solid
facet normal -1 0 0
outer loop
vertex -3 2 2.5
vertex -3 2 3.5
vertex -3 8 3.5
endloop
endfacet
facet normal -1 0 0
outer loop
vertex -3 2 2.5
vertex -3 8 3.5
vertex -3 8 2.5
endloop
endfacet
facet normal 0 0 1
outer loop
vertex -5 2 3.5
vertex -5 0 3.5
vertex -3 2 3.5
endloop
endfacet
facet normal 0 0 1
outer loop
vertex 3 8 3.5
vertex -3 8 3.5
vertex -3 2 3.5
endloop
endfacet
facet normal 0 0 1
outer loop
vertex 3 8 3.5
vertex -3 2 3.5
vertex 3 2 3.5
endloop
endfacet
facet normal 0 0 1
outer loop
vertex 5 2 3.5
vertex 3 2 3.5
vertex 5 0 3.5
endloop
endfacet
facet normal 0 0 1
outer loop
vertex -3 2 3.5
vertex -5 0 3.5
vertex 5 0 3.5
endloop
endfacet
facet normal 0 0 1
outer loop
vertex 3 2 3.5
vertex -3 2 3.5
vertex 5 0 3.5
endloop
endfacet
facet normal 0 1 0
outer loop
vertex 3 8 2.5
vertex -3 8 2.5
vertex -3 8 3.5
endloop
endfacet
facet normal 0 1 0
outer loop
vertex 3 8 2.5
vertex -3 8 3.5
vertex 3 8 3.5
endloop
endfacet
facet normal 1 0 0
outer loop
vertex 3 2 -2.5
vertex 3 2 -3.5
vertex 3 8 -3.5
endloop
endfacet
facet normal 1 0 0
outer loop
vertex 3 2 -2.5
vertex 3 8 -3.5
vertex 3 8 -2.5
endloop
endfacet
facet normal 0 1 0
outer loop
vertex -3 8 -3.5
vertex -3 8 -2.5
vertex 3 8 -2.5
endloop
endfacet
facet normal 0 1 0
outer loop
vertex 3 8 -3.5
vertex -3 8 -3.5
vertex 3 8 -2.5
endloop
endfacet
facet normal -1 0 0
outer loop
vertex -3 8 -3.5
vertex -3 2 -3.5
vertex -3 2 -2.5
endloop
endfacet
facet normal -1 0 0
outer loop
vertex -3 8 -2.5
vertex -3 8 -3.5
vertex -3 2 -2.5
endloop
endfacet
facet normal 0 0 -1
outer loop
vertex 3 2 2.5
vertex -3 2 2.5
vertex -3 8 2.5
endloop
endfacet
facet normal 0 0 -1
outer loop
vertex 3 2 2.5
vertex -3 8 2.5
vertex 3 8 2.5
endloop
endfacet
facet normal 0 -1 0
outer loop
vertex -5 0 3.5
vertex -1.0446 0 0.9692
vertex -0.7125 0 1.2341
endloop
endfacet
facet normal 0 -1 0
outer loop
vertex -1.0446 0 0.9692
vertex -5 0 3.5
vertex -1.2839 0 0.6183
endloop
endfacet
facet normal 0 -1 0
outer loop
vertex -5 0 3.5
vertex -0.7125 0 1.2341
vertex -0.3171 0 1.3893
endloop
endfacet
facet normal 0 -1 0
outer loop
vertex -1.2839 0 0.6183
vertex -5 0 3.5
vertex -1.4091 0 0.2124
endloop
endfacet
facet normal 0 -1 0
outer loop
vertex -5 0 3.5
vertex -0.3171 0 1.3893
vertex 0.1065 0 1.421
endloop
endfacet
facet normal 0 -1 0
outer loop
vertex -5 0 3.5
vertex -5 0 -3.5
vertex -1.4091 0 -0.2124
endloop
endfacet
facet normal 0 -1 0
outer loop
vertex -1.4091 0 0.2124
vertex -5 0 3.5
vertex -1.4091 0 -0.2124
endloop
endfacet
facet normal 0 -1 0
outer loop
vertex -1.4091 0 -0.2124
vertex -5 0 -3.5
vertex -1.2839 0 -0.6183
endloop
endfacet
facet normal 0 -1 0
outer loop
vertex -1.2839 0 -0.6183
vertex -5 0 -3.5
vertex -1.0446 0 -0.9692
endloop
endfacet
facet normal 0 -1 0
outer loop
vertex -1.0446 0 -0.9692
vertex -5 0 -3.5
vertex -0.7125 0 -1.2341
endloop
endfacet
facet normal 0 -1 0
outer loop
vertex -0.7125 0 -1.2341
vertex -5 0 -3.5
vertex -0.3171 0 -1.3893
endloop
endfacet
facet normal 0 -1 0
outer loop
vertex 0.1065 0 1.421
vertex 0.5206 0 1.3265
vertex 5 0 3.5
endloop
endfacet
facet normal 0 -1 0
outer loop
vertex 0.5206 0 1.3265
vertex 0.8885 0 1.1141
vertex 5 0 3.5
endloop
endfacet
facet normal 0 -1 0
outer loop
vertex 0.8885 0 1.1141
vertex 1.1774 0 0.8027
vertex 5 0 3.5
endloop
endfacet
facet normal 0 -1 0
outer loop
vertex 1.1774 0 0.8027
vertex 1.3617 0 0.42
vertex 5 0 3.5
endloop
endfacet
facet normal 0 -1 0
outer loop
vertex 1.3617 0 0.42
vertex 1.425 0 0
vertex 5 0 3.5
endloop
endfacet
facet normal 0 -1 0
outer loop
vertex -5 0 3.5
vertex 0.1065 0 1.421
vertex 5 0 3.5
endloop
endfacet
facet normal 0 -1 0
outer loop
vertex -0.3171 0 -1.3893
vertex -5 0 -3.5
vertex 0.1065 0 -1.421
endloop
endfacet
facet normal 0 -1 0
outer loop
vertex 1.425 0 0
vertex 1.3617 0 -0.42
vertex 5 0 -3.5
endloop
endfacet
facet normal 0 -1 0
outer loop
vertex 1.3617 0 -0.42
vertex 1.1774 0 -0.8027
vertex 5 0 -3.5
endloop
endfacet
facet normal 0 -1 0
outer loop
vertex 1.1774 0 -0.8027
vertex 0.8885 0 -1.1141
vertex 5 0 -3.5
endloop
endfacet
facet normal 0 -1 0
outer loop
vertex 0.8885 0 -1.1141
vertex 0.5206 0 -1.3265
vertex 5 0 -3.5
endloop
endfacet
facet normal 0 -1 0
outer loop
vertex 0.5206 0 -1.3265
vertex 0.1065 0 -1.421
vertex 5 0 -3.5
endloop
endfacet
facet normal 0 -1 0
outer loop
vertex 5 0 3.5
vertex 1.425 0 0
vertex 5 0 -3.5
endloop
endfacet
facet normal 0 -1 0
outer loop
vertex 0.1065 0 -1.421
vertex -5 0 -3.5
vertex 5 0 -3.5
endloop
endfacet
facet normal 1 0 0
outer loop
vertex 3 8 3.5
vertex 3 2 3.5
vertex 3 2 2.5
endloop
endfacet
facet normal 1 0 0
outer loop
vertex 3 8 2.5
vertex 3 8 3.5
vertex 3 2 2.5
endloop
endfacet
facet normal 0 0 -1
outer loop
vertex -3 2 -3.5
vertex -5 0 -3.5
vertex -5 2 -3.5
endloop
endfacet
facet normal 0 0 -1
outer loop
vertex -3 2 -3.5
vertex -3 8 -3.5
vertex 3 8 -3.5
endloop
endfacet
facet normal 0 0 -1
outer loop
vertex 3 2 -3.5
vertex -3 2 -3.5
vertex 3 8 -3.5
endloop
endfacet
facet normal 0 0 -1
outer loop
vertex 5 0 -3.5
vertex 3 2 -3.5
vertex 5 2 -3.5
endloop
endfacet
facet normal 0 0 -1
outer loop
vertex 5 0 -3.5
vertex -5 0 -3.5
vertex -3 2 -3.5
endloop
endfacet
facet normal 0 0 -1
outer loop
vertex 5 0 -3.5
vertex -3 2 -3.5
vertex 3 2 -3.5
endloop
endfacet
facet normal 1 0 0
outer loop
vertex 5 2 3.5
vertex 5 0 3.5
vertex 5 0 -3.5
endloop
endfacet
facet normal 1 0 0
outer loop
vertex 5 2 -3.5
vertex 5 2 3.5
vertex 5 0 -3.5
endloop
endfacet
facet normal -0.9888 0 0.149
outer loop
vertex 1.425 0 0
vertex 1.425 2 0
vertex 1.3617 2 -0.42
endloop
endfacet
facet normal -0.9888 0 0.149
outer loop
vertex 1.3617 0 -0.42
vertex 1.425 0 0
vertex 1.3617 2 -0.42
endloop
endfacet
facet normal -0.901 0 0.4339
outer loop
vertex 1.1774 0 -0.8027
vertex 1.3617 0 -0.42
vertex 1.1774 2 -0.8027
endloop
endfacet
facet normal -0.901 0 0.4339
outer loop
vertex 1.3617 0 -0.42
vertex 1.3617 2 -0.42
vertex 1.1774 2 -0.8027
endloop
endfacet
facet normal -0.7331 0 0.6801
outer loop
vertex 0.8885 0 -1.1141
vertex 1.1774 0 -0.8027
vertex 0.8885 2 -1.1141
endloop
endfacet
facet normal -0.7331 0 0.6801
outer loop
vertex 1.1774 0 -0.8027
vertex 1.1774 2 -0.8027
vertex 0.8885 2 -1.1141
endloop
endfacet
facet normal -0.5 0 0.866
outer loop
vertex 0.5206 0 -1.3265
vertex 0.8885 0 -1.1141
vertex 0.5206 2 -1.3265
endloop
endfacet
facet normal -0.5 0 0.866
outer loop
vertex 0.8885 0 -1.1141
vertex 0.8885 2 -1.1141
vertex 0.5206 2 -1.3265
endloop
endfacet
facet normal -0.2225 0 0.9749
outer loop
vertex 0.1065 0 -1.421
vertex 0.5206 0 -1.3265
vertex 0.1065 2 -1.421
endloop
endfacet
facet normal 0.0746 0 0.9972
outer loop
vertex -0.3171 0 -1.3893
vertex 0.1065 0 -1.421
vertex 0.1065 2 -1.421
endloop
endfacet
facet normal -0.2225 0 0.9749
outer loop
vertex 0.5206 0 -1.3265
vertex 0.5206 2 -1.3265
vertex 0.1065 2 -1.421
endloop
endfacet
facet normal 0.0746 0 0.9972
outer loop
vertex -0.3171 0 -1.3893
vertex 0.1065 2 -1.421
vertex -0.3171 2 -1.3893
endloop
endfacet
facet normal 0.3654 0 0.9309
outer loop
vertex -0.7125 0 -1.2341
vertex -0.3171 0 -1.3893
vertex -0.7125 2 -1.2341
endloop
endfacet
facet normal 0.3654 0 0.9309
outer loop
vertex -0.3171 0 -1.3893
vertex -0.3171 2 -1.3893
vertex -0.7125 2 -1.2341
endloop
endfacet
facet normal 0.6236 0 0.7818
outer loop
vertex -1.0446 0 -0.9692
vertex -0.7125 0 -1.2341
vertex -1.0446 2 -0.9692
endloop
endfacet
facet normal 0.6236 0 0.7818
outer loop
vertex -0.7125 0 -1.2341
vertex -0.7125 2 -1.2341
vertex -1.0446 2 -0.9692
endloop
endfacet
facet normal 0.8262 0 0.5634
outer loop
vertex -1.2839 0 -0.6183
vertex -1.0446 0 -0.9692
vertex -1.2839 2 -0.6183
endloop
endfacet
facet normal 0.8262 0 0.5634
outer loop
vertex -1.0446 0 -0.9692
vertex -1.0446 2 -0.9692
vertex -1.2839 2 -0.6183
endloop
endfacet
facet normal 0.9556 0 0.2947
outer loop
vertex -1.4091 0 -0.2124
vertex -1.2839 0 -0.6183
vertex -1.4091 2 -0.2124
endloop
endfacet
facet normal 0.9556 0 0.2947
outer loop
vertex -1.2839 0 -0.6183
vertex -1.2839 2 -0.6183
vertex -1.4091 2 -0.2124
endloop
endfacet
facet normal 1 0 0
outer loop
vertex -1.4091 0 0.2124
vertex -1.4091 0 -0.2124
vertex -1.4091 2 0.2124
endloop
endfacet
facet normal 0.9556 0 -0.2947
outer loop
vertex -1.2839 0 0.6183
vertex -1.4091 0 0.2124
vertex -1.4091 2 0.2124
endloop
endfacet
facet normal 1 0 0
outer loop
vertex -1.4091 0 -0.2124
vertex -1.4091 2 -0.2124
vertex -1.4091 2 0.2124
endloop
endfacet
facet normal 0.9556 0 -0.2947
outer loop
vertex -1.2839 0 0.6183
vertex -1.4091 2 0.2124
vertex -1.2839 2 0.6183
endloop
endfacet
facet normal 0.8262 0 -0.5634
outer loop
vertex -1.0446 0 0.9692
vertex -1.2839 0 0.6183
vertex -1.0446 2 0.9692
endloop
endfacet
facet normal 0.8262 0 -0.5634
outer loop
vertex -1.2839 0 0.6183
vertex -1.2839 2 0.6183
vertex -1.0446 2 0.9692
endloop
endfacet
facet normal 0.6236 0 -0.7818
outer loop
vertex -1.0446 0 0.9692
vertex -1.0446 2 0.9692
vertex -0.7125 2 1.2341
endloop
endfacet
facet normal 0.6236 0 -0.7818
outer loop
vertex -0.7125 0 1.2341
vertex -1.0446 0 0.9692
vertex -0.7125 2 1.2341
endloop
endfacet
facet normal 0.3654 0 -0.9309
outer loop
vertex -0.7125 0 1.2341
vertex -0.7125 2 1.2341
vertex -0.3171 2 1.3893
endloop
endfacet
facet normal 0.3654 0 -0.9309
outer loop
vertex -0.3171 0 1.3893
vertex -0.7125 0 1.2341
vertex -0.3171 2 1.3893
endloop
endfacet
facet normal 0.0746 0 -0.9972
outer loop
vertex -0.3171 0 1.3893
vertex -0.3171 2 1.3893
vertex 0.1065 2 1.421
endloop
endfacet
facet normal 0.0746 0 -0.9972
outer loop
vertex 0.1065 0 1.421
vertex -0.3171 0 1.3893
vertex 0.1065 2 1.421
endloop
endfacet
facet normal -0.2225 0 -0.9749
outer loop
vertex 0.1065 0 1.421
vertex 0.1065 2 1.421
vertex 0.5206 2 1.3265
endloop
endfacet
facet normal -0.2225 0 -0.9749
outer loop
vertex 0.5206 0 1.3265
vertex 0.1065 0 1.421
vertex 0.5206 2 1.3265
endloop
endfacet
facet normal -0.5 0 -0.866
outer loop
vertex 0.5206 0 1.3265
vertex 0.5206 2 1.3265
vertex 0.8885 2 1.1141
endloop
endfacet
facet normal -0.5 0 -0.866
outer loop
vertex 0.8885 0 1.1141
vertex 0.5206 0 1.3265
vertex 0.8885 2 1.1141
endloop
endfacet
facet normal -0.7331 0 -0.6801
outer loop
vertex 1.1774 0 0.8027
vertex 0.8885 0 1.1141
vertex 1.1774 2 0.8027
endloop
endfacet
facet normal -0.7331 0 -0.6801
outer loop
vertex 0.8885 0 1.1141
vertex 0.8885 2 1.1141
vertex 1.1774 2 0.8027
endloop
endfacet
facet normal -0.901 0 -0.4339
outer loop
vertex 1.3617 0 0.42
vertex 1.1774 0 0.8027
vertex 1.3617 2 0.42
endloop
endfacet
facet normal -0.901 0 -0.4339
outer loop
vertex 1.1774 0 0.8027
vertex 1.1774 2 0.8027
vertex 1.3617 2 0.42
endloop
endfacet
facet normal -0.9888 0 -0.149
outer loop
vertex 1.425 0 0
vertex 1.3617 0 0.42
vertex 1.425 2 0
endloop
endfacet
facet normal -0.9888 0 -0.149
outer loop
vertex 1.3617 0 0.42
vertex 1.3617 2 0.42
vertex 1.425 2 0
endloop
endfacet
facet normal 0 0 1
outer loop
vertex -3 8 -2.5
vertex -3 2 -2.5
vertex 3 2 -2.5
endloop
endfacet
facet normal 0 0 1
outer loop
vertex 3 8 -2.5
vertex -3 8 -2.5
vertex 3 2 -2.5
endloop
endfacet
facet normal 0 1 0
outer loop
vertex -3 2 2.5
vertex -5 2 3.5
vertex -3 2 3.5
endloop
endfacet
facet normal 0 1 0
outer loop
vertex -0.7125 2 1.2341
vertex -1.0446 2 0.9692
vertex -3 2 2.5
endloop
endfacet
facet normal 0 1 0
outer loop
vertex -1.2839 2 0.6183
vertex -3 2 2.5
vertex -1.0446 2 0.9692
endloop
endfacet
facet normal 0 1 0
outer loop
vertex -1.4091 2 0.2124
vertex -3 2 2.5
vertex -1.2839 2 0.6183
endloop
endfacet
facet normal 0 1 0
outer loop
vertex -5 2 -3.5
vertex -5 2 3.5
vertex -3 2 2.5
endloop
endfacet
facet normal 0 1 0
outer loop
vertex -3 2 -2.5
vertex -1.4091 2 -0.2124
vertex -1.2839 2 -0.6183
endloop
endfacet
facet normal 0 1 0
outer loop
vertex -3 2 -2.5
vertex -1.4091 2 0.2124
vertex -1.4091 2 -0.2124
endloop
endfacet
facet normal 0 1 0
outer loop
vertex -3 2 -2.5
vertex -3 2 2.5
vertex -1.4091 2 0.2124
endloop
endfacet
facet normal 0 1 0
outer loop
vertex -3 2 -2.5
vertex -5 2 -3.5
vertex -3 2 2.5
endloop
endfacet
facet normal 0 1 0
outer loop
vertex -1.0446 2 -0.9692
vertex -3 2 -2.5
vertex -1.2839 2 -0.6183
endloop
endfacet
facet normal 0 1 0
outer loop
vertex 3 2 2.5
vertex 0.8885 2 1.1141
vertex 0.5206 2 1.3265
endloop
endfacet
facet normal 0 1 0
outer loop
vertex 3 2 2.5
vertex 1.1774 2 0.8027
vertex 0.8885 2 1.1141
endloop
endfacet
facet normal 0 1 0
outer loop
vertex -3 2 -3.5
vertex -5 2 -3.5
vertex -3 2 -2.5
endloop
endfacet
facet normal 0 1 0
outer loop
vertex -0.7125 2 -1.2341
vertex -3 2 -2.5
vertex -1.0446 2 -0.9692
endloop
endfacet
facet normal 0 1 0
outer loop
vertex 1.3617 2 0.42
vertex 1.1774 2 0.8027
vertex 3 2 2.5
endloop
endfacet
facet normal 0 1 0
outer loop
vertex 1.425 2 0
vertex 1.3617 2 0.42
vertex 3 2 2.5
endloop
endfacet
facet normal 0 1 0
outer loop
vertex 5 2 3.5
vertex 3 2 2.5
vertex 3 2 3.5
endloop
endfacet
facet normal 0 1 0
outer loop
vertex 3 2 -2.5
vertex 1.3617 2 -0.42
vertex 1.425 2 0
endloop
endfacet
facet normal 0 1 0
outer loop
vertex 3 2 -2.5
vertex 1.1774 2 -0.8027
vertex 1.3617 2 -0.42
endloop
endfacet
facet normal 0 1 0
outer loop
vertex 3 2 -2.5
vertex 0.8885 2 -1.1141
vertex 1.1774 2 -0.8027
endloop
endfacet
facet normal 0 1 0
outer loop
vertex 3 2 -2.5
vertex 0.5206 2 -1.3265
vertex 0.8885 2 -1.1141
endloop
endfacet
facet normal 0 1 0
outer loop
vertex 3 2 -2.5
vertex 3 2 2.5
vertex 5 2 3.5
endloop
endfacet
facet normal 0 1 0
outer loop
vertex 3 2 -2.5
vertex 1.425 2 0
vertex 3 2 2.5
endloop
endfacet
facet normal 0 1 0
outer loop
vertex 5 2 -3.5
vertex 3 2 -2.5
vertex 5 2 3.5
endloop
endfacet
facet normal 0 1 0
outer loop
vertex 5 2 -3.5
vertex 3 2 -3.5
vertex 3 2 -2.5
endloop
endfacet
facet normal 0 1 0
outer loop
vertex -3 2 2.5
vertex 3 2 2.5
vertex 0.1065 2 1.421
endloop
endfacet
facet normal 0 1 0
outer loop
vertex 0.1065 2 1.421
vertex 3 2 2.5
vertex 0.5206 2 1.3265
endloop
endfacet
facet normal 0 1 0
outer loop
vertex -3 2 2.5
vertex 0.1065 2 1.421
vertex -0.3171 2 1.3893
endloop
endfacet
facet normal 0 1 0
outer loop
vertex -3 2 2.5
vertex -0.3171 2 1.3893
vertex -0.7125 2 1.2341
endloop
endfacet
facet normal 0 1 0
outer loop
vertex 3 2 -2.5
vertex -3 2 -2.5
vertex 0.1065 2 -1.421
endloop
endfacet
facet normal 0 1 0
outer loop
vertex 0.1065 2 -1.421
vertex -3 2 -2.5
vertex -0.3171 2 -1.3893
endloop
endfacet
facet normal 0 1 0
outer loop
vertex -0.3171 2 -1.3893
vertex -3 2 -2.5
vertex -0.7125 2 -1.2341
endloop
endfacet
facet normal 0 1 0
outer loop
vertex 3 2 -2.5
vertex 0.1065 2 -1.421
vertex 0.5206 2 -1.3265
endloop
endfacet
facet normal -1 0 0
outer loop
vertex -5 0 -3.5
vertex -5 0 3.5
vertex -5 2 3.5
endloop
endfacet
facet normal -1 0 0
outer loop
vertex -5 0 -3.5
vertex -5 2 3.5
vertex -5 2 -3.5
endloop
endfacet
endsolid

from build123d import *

# Parameters (mm, degrees)
SKETCH1_W           = 10
SKETCH1_H           = 7
BOSS_EXTRUDE1_DEPTH = 2
SKETCH2_R           = 1.425
CUT_EXTRUDE1_DEPTH  = 2
SKETCH3_W           = 6
SKETCH3_H           = 1
BOSS_EXTRUDE2_DEPTH = 6


with BuildPart() as part:
    # Sketch1 → Boss-Extrude1 (new body)
    with BuildSketch(Plane(origin=(0, 0, 0), x_dir=(1, 0, 0), z_dir=(0, 1, 0))):
        Rectangle(SKETCH1_W, SKETCH1_H)
    extrude(amount=BOSS_EXTRUDE1_DEPTH)

    # Sketch2 → Cut-Extrude1 (cut)
    with BuildSketch(Plane(origin=(0, 2, 0), x_dir=(1, 0, 0), z_dir=(0, 1, 0))):
        Circle(SKETCH2_R)
    extrude(amount=-CUT_EXTRUDE1_DEPTH, mode=Mode.SUBTRACT)

    # Sketch3 → Boss-Extrude2 (add)
    with BuildSketch(Plane(origin=(0, 2, 0), x_dir=(1, 0, 0), z_dir=(0, 1, 0))):
        with Locations((0, -3)):
            Rectangle(SKETCH3_W, SKETCH3_H)
    boss_extrude2 = extrude(amount=BOSS_EXTRUDE2_DEPTH)

    # Mirror1: Boss-Extrude2 across plane
    add(boss_extrude2.mirror(Plane.XY))


solid = part.part
